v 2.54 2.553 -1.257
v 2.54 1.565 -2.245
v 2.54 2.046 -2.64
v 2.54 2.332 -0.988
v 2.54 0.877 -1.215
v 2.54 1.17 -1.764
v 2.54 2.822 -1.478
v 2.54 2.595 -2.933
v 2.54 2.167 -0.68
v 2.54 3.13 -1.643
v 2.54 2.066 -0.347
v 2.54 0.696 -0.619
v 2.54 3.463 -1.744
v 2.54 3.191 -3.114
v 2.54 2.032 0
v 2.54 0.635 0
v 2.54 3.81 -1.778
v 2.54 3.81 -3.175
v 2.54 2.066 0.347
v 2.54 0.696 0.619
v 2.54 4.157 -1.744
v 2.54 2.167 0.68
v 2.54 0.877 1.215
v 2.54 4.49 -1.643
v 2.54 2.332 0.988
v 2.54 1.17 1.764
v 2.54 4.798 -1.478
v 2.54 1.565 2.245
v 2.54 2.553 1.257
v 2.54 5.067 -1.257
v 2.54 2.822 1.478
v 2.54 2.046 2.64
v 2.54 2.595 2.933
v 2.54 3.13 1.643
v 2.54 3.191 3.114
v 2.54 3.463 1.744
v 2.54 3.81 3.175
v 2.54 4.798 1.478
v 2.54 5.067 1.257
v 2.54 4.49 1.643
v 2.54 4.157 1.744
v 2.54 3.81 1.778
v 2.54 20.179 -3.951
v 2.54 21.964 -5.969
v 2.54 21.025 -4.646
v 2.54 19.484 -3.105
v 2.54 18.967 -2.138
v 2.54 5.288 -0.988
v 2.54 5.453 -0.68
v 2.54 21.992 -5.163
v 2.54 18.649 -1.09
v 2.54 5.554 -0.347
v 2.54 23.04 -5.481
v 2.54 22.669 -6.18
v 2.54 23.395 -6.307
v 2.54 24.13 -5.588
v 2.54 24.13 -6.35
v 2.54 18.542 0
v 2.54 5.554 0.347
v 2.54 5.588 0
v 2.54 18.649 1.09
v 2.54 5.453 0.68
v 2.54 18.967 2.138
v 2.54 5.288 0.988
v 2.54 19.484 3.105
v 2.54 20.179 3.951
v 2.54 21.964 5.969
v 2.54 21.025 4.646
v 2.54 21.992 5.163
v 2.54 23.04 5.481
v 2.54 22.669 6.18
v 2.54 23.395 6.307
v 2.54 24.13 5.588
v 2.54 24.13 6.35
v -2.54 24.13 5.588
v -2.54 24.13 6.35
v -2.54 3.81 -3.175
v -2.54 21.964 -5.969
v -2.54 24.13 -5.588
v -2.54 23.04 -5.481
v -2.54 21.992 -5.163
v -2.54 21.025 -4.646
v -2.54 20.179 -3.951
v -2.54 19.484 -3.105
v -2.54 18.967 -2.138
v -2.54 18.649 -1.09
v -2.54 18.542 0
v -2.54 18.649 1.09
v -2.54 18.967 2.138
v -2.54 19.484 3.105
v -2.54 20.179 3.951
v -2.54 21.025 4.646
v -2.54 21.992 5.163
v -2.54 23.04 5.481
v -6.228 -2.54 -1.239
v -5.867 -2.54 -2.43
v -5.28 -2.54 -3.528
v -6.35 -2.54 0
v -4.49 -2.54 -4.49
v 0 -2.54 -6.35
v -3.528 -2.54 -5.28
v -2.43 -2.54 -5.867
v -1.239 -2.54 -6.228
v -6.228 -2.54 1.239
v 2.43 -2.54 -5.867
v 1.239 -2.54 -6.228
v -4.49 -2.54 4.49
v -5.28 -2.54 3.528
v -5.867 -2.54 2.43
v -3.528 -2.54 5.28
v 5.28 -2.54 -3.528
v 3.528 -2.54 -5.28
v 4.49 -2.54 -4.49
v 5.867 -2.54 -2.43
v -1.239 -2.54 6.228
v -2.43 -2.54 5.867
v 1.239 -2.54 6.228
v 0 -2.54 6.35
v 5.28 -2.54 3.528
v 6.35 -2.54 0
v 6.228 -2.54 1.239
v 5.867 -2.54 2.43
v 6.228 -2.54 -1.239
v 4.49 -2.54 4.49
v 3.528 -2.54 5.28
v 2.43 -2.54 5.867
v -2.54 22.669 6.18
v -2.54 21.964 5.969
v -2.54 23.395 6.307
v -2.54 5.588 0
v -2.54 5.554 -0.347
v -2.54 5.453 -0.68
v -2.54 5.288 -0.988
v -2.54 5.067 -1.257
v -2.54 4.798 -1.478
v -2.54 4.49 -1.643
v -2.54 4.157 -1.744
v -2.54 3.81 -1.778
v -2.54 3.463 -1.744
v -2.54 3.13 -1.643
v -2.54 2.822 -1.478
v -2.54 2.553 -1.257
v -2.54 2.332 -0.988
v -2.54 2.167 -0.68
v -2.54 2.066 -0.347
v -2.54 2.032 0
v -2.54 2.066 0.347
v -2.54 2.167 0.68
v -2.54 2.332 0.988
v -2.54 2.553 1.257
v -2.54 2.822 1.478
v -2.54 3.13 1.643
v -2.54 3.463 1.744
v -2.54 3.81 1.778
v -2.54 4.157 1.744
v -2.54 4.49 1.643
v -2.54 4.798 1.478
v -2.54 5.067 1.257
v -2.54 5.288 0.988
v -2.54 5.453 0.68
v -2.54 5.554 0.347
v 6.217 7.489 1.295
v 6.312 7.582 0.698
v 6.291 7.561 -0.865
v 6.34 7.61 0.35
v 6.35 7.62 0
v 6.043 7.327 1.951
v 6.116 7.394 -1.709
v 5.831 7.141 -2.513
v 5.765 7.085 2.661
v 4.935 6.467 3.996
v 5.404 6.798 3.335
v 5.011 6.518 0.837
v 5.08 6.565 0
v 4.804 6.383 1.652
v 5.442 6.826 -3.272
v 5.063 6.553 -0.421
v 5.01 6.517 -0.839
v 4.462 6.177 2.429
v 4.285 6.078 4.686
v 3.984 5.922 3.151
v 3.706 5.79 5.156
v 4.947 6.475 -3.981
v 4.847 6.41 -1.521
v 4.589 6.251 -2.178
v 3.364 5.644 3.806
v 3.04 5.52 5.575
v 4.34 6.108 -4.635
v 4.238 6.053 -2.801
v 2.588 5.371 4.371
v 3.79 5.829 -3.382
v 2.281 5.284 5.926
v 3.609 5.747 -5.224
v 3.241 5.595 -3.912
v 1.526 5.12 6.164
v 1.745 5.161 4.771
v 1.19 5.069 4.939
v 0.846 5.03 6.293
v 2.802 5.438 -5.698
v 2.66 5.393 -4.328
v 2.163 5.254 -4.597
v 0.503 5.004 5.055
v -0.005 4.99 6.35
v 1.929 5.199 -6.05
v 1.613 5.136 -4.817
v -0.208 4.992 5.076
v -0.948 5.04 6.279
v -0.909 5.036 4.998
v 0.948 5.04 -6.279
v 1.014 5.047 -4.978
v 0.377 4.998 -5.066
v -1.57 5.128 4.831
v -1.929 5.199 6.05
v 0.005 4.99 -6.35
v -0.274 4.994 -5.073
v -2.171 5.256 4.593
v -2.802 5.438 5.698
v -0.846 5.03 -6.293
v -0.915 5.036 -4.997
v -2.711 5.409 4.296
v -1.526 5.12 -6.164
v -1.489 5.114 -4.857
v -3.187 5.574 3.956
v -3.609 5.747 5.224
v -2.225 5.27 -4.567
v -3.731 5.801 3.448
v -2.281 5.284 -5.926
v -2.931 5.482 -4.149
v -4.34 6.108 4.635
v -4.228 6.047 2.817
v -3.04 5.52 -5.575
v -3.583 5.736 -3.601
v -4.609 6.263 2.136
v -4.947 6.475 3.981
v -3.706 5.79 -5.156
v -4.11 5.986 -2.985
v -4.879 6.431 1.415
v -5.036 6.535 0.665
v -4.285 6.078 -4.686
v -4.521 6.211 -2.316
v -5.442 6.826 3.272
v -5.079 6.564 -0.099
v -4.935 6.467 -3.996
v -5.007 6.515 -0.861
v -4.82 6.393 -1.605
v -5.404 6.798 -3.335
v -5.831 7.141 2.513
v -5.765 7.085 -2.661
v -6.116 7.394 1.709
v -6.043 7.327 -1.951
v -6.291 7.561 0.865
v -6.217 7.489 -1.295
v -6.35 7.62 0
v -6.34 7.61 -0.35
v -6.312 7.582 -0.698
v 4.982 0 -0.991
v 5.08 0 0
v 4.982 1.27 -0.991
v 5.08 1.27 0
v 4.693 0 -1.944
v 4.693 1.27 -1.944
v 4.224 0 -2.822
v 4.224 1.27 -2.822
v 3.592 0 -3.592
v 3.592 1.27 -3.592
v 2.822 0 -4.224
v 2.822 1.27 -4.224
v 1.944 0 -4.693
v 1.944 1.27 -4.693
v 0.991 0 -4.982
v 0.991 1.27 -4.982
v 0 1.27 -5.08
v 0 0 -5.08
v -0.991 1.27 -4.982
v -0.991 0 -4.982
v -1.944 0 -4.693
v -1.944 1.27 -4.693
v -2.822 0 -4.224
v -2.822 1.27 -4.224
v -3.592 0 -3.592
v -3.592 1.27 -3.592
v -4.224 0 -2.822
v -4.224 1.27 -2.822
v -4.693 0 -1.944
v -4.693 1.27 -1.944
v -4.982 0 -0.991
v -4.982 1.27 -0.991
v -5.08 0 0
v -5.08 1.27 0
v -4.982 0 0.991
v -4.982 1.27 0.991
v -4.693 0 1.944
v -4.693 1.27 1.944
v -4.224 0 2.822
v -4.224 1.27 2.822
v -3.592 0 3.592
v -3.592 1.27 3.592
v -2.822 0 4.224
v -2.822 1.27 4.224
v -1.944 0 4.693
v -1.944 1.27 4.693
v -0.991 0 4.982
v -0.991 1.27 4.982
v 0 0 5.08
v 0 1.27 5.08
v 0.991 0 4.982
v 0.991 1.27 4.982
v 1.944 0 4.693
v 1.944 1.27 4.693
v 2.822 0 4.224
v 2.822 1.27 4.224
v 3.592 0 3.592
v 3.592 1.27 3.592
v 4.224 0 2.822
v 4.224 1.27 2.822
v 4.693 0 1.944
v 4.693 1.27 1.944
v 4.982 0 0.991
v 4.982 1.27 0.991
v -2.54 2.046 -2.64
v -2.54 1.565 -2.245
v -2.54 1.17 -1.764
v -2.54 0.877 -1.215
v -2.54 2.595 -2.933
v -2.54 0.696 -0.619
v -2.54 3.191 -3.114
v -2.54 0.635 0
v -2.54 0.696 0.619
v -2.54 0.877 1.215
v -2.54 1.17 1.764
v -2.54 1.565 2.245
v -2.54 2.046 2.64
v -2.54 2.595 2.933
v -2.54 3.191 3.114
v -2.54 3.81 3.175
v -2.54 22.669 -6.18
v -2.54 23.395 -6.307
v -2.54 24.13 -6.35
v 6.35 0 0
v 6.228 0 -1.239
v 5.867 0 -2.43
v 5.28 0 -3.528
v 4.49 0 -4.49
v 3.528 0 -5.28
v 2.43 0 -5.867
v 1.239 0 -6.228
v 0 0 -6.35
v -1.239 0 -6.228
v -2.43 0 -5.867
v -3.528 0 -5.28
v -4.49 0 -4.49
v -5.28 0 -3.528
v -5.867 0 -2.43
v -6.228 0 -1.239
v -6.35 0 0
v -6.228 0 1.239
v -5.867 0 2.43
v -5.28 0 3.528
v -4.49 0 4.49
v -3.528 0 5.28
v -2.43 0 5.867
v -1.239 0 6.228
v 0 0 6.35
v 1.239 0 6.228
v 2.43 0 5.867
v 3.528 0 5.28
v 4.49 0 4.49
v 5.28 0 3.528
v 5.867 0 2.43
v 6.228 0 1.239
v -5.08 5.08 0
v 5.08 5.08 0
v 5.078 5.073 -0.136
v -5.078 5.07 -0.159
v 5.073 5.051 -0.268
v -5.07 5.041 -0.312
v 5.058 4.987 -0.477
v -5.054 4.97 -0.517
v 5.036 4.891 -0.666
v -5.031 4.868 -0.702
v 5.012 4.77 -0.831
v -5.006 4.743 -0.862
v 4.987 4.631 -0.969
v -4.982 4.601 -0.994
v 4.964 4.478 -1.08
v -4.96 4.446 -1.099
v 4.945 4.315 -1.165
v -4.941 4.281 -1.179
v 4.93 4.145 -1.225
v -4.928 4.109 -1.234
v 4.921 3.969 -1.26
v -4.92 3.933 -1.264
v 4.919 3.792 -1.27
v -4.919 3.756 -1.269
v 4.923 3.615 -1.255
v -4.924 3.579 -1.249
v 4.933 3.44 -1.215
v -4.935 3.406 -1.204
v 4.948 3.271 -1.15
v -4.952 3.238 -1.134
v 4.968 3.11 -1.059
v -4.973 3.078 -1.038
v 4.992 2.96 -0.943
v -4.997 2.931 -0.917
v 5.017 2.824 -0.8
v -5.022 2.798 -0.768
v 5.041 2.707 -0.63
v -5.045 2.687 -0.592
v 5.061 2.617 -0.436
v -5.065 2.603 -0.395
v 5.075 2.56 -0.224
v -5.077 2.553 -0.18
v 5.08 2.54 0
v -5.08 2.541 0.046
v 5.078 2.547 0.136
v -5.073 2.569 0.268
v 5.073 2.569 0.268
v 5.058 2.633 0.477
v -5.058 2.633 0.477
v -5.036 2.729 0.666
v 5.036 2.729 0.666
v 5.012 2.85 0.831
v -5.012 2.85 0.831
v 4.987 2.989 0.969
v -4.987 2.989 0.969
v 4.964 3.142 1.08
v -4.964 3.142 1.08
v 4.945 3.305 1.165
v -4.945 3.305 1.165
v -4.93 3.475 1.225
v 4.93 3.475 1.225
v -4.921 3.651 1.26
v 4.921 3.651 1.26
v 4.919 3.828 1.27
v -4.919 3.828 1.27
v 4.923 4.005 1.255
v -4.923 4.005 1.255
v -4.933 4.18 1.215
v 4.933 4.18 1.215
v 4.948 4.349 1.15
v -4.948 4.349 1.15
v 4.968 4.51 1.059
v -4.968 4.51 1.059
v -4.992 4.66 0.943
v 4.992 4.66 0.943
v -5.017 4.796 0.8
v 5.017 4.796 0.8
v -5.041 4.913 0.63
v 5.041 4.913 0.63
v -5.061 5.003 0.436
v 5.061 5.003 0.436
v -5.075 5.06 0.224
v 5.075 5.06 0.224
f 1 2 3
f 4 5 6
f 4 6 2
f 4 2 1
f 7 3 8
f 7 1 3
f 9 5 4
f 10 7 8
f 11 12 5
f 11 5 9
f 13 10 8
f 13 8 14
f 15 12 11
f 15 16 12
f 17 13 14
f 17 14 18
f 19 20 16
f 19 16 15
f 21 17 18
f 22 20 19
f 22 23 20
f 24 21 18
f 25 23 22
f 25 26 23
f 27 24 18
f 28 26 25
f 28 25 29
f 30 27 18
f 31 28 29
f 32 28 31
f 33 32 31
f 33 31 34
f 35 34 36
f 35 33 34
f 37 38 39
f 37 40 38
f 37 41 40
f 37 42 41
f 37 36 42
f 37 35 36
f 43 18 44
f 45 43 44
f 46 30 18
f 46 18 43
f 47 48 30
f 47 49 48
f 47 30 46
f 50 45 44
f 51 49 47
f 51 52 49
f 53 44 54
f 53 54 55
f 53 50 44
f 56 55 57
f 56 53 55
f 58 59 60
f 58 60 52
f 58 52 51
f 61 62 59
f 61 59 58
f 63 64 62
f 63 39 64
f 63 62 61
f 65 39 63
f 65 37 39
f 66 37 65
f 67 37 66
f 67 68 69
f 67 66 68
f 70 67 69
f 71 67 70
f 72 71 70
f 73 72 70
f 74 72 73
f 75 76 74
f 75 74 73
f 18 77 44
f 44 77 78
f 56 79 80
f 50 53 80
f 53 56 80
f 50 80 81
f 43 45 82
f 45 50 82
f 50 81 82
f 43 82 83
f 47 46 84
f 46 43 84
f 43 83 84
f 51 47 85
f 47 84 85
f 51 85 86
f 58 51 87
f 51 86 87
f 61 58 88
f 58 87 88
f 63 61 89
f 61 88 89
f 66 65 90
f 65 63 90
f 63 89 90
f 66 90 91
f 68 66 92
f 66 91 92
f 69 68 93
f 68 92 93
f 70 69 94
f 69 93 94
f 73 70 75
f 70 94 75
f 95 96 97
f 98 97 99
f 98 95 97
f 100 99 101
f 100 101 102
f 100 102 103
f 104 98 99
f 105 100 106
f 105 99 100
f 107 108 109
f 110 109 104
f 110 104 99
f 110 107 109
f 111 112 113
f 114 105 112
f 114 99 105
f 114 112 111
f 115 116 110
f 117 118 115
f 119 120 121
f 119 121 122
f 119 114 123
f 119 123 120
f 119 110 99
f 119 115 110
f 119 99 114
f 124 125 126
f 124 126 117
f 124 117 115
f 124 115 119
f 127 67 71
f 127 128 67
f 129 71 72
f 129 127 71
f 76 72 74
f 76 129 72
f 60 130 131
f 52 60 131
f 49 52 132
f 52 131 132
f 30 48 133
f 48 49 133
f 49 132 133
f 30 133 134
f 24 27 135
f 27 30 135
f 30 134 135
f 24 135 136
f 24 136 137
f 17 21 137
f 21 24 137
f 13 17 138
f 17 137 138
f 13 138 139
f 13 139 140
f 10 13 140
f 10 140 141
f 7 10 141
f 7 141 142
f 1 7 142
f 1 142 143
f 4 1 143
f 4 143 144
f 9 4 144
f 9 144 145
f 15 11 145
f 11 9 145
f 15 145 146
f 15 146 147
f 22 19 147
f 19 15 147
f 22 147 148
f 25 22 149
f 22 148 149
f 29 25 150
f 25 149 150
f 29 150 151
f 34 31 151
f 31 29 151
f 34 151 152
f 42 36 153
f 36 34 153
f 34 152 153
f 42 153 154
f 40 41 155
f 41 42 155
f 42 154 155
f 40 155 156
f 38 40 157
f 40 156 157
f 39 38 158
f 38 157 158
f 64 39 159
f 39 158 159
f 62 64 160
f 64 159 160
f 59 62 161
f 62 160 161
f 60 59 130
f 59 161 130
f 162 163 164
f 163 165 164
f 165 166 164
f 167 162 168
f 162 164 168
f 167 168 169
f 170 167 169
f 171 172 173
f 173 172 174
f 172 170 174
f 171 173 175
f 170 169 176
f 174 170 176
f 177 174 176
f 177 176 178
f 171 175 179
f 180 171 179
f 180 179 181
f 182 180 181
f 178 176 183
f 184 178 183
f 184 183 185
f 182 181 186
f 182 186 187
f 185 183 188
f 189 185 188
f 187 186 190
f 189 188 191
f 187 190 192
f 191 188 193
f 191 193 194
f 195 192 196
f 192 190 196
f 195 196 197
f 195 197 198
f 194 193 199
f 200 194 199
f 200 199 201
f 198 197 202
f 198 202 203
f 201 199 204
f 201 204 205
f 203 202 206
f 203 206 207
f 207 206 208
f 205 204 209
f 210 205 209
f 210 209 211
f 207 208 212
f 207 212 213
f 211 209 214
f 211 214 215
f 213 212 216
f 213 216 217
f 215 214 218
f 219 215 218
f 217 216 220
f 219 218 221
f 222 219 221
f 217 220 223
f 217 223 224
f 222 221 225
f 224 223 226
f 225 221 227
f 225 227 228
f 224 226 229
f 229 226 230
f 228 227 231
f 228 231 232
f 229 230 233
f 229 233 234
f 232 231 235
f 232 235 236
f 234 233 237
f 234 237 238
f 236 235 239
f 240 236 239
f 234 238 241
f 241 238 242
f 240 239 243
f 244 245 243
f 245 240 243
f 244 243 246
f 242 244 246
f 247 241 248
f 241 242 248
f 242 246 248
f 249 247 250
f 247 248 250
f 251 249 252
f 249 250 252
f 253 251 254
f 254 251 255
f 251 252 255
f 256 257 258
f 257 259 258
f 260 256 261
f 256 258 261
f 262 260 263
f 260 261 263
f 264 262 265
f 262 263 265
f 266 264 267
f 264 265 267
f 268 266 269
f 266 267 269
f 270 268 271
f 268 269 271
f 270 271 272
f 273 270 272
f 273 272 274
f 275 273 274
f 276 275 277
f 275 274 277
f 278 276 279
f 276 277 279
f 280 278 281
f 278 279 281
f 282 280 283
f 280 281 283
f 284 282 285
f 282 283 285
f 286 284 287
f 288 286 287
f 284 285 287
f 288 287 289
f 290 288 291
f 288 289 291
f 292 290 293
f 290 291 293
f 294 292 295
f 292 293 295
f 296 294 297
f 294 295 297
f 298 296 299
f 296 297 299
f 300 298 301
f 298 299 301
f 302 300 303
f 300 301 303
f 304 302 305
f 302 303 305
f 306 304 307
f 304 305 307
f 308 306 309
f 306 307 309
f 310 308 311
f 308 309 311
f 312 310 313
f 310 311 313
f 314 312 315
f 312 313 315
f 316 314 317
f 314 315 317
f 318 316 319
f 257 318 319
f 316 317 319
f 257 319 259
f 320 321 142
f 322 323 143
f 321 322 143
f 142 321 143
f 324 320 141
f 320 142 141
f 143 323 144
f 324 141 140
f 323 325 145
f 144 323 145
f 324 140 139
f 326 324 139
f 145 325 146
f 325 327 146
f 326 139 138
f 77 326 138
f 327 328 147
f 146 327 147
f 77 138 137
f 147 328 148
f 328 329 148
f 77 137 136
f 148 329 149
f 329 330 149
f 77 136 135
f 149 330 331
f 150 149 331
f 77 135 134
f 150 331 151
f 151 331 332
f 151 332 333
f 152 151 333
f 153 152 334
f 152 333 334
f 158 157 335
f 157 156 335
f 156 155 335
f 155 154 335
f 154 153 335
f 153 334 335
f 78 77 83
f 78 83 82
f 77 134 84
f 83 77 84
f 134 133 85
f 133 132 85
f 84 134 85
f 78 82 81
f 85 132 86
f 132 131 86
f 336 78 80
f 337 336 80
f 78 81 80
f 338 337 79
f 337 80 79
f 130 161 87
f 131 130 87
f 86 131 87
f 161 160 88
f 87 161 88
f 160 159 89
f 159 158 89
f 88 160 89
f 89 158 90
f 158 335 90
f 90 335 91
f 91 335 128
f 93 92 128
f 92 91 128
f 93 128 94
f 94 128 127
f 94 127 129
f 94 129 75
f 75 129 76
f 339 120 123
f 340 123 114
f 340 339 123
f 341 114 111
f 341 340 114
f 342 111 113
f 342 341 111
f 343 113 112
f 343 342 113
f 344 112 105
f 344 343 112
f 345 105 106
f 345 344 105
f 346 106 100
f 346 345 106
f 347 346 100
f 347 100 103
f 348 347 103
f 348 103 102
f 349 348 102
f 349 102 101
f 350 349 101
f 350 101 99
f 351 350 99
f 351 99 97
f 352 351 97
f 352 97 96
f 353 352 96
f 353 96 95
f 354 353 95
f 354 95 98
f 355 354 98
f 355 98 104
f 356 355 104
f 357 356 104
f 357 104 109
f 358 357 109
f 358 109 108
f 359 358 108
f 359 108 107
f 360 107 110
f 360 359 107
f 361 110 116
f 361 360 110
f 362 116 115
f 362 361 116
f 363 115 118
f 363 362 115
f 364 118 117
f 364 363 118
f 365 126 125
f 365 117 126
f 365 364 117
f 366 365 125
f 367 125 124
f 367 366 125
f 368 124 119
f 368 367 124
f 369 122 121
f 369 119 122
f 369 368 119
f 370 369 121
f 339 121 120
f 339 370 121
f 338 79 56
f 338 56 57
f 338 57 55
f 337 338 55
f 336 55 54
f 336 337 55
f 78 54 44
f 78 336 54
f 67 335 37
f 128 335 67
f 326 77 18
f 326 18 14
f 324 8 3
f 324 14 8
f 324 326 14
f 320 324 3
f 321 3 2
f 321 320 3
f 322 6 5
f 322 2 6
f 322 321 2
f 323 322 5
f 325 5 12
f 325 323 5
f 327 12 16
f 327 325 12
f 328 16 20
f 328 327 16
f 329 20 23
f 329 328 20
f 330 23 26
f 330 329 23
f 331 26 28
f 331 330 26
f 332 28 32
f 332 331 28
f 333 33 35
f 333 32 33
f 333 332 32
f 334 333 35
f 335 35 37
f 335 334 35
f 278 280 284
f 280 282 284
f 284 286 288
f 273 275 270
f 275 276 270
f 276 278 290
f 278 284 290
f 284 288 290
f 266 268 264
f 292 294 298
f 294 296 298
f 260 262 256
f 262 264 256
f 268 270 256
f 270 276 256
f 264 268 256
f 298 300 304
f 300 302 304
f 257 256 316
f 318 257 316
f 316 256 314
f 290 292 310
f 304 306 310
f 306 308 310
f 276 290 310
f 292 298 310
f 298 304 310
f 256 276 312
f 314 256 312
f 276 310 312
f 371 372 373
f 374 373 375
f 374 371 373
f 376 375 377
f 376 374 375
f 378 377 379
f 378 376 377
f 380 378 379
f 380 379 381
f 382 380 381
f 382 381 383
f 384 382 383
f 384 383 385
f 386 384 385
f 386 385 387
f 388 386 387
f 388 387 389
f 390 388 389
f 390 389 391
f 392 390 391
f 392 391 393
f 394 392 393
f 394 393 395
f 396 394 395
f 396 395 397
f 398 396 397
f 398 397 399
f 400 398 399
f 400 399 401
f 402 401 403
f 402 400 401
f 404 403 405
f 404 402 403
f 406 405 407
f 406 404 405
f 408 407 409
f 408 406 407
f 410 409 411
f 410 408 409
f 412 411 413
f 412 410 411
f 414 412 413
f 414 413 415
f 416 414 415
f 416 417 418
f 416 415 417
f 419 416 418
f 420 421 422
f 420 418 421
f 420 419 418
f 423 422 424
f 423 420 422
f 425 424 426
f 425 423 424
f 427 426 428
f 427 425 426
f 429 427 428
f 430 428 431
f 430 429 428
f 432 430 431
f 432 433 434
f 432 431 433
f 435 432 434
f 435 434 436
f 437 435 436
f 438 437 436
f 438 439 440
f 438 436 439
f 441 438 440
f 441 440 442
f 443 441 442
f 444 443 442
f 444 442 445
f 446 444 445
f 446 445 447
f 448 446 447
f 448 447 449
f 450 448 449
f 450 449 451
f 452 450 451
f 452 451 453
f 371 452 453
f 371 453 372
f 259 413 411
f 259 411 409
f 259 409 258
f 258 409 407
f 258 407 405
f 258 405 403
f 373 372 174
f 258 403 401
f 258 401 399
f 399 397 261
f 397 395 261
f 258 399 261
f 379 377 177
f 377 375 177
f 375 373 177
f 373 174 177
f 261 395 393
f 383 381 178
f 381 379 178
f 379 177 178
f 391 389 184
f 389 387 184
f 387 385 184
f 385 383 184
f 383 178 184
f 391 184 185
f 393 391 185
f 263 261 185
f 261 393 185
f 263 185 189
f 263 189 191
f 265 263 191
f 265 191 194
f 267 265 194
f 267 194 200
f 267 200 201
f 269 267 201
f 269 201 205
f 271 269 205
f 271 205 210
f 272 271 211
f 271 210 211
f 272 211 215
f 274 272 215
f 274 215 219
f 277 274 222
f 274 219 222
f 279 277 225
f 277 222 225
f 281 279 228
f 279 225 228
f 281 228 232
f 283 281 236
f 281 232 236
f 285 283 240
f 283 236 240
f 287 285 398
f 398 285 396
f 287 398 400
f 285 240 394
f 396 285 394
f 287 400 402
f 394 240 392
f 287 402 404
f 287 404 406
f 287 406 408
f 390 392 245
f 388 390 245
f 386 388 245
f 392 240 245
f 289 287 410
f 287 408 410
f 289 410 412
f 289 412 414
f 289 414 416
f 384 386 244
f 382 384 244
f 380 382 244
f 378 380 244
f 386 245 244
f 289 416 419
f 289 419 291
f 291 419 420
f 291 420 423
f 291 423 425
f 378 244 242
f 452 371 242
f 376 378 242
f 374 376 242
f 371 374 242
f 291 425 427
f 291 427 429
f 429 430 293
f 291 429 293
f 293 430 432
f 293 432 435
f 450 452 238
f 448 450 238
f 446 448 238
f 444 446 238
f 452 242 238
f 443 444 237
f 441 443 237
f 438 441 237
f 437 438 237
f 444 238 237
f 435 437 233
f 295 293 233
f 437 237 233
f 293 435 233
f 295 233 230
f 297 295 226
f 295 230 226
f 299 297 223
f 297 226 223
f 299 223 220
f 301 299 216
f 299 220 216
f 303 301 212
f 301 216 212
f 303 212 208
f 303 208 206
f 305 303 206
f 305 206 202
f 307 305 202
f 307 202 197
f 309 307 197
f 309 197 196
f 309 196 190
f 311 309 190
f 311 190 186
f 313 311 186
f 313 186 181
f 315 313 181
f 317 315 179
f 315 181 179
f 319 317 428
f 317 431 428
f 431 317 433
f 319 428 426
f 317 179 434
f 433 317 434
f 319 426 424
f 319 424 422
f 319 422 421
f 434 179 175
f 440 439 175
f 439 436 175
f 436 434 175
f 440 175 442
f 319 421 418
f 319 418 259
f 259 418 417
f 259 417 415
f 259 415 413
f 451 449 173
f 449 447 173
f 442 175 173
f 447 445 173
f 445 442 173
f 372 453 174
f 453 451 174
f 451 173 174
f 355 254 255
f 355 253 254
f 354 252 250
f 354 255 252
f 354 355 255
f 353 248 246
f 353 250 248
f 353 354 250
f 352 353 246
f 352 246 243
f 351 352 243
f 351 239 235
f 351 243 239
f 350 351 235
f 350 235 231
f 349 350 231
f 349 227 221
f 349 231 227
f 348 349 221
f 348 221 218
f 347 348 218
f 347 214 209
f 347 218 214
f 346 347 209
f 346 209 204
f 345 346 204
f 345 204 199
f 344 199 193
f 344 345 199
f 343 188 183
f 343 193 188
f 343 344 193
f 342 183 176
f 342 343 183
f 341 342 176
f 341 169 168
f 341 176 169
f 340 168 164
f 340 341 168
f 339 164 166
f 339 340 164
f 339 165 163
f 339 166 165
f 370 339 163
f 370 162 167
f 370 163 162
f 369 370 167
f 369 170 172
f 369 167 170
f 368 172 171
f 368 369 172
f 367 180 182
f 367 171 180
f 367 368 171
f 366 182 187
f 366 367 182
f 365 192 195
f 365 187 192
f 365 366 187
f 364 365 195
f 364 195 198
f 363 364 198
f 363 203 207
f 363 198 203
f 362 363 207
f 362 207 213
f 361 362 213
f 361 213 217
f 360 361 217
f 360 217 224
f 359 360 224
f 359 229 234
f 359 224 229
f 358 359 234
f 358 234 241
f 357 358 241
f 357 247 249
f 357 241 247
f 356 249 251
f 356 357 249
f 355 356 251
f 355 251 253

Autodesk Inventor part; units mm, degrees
ref_plane "XZ Plane" through (0, 0, 0) normal (0, 1, 0) x (-1, 0, 0)
ref_plane "XY Plane" through (0, 0, 0) normal (0, 0, 1) x (1, 0, 0)
sketch "Sketch1" plane through (0, 0, 0) normal (0, 1, 0) x (-1, 0, 0)
  circle A0 centre (0, 0) radius 6.35
  dimension "d0" = 12.7
extrude "Extrusion1" add sketch "Sketch1" along normal blind 7.62
sketch "Sketch2" plane through (0, 0, 0) normal (0, 0, 1) x (1, 0, 0)
  line L0 (6.35, 7.62) -> (-6.35, 7.62) projected
  arc A0 (-6.35, 7.62) -> (6.35, 7.62) centre (0, 13.97) ccw
  line L1 (-6.35, 7.62) -> (-6.35, 5.08) construction
  line L2 (-6.35, 0) -> (-6.35, 7.62) construction
  point P0 (0, 0)
  dimension "d5" = 2.54
  dimension "d6" = 8.89
extrude "Extrusion2" cut sketch "Sketch2" along normal mid plane 25.4
ref_plane "Work Plane1" through (0, 7.62, 0) normal (0, -1, 0) x (1, 0, 0)
sketch "Sketch3" plane through (0, 7.62, 0) normal (0, -1, 0) x (1, 0, 0)
  circle A0 centre (0, 0) radius 5.08
  dimension "d10" = 10.16
extrude "Extrusion3" cut sketch "Sketch3" along normal blind 6.35
sketch "Sketch4" plane through (0, 0, 0) normal (1, 0, 0) x (0, 1, 0)
  circle A0 centre (3.81, 0) radius 1.27
  line L0 (1.27, 5.08) -> (1.27, -5.08) projected
  point P0 (0, 0)
  dimension "d13" = 2.54
  dimension "d14" = 2.54
extrude "Extrusion4" add sketch "Sketch4" along normal mid plane 11.43
sketch "Sketch6" plane through (0, 1.27, 0) normal (0, 1, 0) x (1, 0, 0)
  circle A0 centre (0, 0) radius 5.08 projected
extrude "Extrusion6" cut sketch "Sketch6" against normal blind 25.4
sketch "Sketch5" plane through (0, 0, 0) normal (1, 0, 0) x (0, 1, 0)
  circle A0 centre (3.81, 0) radius 1.778
  arc A1 (3.81, 3.175) -> (3.81, -3.175) centre (3.81, 0) ccw
  arc A2 (24.13, 5.588) -> (24.13, -5.588) centre (24.13, 0) ccw
  line L0 (24.13, 6.35) -> (24.13, 5.588)
  line L1 (24.13, -5.588) -> (24.13, -6.35)
  arc A3 (24.13, 6.35) -> (21.9635, 5.969) centre (24.13, 0) ccw
  arc A4 (21.9635, -5.969) -> (24.13, -6.35) centre (24.13, 0) ccw
  line L2 (3.81, 3.175) -> (21.9635, 5.969)
  line L3 (3.81, -3.175) -> (21.9635, -5.969)
  point P0 (0, 0)
  point P1 (3.81, 1.27)
  dimension "d17" = 3.556
  dimension "d18" = 6.35
  dimension "d21" = 11.176
  dimension "d22" = 0
  dimension "d23" = 20.32
extrude "Extrusion5" add sketch "Sketch5" along normal mid plane 5.08
sketch "Sketch7" plane through (0, 0, 0) normal (0, -1, 0) x (1, 0, 0)
  circle A0 centre (0, 0) radius 5.08 construction
  circle A1 centre (0, 0) radius 6.35 projected
extrude "Extrusion7" add sketch "Sketch7" along normal blind 2.54
sketch "Sketch8" plane through (0, 0, 0) normal (1, 0, 0) x (0, 1, 0)
  point P0 (0, 0)
properties part number "PistonTest2"
